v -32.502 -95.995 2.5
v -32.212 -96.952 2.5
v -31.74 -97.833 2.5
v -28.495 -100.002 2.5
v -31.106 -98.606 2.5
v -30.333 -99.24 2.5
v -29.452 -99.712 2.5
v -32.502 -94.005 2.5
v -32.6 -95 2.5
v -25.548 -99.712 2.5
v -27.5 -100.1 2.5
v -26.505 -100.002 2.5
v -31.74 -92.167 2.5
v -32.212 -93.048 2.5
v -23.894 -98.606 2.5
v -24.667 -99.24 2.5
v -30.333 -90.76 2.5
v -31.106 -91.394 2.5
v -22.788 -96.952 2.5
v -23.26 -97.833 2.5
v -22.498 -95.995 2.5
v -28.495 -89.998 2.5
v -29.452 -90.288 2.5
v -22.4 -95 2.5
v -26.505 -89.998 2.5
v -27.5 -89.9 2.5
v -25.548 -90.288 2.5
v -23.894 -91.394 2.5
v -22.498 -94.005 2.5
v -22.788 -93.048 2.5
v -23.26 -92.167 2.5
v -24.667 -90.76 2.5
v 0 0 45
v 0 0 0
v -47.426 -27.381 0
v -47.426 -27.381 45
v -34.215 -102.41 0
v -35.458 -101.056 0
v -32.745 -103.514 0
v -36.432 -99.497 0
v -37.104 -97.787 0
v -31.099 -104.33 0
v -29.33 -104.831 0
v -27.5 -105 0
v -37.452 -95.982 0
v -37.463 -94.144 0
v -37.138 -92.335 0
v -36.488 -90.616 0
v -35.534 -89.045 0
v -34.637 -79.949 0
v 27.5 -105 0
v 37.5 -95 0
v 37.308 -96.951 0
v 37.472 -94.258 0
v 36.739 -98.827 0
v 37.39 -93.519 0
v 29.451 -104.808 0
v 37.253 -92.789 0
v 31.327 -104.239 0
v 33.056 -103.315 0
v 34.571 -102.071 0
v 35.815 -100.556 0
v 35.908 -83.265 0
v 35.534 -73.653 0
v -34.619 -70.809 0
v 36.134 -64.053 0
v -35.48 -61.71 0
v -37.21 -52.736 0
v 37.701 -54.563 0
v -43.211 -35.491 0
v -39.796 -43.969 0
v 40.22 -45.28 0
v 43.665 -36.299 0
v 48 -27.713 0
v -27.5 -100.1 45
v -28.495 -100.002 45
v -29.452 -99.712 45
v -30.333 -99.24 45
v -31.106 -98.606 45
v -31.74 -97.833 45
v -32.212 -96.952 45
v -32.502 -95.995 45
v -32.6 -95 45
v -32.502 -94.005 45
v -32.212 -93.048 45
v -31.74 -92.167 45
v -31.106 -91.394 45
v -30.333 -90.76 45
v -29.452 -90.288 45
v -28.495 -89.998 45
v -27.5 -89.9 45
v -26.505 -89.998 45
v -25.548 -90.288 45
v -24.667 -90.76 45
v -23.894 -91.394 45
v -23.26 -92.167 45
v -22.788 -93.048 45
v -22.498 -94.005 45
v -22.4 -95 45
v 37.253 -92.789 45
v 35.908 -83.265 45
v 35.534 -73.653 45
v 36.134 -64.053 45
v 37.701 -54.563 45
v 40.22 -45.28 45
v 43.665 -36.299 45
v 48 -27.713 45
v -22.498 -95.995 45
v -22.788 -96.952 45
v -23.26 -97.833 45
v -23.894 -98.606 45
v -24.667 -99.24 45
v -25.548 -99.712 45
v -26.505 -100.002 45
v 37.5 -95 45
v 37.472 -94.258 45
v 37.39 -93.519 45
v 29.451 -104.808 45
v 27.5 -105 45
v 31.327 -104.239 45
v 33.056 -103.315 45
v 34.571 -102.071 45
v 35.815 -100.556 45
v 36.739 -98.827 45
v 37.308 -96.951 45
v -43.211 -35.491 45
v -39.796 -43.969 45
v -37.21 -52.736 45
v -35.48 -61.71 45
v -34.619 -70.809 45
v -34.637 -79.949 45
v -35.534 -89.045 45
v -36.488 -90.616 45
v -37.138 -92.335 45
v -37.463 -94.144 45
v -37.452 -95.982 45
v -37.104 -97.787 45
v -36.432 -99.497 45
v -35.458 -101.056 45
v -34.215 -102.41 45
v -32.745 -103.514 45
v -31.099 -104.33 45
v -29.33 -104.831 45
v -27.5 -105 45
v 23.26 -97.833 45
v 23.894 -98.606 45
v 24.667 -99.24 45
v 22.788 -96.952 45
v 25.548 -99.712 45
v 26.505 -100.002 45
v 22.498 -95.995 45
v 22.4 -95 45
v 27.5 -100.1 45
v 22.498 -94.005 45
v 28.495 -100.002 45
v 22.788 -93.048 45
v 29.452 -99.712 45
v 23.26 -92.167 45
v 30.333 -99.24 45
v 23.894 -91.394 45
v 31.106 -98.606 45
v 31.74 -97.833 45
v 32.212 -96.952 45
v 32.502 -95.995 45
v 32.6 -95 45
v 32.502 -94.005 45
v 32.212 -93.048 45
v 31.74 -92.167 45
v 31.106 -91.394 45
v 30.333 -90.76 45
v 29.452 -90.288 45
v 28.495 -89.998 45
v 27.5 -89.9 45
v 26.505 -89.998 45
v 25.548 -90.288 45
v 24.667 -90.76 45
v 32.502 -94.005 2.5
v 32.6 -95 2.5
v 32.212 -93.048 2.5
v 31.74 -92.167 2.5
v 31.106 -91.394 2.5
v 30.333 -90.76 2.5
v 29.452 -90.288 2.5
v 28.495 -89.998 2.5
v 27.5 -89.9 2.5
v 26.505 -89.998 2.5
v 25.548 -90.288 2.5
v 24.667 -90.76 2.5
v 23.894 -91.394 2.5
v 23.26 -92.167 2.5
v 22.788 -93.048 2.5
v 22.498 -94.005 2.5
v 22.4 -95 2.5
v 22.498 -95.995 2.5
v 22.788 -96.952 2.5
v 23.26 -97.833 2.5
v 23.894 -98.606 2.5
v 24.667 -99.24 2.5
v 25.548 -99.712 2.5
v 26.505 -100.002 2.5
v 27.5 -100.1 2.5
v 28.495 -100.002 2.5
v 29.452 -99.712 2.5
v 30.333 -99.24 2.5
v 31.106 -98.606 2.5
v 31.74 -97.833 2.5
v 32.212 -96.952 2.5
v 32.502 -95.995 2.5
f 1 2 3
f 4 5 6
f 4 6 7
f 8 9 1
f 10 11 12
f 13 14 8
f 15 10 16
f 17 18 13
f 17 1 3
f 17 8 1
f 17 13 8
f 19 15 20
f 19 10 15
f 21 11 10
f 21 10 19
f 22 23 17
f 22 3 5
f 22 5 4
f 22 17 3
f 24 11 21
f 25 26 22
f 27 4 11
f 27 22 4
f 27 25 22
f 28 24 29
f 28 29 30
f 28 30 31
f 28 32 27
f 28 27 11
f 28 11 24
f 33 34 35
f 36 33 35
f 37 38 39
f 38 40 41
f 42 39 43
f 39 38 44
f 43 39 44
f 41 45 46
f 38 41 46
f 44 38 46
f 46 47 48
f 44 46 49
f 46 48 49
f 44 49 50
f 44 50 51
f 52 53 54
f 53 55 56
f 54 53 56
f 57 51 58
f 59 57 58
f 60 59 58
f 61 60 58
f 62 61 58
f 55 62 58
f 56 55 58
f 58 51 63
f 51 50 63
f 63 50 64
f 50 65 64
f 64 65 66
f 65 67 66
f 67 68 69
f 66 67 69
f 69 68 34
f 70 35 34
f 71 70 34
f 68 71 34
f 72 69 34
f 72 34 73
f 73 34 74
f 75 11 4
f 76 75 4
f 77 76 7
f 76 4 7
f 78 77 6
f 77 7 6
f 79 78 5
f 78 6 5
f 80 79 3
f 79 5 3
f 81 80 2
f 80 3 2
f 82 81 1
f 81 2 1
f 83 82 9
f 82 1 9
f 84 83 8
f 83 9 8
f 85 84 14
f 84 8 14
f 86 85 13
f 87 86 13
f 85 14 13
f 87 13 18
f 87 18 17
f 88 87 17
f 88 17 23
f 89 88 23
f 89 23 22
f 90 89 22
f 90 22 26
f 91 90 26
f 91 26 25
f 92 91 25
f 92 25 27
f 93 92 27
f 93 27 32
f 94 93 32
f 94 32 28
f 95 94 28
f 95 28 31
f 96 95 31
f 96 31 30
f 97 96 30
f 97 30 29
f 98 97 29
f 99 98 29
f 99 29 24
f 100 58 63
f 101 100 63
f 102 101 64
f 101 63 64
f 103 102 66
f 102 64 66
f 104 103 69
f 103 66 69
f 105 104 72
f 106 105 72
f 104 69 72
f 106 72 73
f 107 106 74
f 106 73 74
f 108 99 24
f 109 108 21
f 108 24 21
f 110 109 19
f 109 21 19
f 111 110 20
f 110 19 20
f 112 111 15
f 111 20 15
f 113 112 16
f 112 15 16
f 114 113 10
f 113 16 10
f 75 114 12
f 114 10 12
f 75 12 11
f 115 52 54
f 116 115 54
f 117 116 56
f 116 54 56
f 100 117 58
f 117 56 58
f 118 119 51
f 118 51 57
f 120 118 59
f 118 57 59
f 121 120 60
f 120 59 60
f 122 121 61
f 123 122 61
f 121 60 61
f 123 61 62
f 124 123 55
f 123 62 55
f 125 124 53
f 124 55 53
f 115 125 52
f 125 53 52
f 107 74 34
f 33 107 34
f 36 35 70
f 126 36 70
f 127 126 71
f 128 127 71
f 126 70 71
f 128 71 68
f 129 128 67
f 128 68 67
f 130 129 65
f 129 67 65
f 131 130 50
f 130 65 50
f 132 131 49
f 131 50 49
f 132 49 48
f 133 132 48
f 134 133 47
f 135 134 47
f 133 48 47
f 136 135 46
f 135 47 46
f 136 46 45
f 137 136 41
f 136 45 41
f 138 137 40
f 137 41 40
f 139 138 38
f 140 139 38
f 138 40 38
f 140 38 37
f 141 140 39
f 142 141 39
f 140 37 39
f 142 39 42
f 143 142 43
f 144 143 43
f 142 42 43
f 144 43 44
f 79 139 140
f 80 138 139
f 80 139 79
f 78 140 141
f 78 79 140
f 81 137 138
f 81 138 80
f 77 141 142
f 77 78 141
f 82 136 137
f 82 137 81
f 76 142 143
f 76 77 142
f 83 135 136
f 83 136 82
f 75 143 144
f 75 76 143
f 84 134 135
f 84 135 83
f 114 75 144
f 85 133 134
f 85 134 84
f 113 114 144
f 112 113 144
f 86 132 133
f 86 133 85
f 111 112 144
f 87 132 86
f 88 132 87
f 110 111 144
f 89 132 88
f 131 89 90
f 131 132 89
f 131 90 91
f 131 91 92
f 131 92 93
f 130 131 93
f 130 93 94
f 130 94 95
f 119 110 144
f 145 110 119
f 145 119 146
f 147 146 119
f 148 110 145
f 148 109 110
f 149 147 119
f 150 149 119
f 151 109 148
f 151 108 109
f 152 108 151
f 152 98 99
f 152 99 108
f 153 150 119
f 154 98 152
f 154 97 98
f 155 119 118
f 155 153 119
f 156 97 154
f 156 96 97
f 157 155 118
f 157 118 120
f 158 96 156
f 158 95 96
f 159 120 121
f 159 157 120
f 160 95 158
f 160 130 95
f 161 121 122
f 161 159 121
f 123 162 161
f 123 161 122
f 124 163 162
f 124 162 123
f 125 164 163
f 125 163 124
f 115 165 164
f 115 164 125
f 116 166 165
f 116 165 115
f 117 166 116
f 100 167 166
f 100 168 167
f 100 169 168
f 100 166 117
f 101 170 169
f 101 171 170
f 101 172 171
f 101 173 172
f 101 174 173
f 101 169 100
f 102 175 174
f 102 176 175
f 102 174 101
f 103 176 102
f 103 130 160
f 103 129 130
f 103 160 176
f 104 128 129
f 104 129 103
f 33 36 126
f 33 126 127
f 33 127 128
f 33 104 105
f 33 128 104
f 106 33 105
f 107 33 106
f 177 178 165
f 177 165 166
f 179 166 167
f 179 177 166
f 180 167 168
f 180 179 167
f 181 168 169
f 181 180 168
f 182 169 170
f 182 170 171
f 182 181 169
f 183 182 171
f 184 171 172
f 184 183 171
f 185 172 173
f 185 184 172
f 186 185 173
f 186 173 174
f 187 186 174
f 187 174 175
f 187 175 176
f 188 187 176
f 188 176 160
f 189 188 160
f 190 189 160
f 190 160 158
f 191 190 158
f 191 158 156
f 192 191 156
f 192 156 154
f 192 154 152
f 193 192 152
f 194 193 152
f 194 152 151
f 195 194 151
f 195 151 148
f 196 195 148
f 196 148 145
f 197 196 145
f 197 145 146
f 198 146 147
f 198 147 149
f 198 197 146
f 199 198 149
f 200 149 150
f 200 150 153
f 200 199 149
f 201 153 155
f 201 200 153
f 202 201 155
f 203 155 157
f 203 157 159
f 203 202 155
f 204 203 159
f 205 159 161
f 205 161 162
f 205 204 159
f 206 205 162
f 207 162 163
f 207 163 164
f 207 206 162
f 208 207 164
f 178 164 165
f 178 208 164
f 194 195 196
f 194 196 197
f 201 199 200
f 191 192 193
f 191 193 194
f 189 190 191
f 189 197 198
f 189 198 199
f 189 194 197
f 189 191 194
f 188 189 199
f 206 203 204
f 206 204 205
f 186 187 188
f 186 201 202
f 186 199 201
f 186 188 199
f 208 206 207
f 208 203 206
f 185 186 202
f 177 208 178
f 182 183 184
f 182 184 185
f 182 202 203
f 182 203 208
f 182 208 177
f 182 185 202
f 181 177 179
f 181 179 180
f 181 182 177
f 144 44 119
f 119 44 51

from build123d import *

# Parameters (mm, degrees)
F0_R     = 5.1
F1_DEPTH = 45
F2_DEPTH = 2.5


with BuildPart() as f1:
    # F0 (on Top) → F1 (new body)
    with BuildSketch(Plane.XY):
        with BuildLine():
            Line((47.999931, -27.712773), (0, 0))
            Line((0, 0), (-47.425757, -27.381273))
            ThreePointArc((-47.425757, -27.381273), (-36.236956, -57.202053), (-35.533555, -89.045002))
            ThreePointArc((-35.533555, -89.045002), (-24.364362, -85.504329), (-17.5, -95))
            ThreePointArc((-17.5, -95), (-20.428932, -102.071068), (-27.5, -105))
            Line((-27.5, -105), (27.5, -105))
            ThreePointArc((27.5, -105), (19.686236, -88.7594), (37.252515, -92.789018))
            ThreePointArc((37.252515, -92.789018), (36.797234, -59.288231), (47.999931, -27.712773))
        make_face()
        with BuildLine():
            ThreePointArc((-17.5, -95), (-24.364362, -85.504329), (-35.533555, -89.045002))
            ThreePointArc((-35.533555, -89.045002), (-36.431685, -99.497223), (-27.5, -105))
            ThreePointArc((-27.5, -105), (-20.428932, -102.071068), (-17.5, -95))
        make_face()
        with BuildLine():
            ThreePointArc((-22.4, -95), (-23.893755, -98.606245), (-27.5, -100.1))
            ThreePointArc((-27.5, -100.1), (-31.106245, -91.393755), (-22.4, -95))
        make_face(mode=Mode.SUBTRACT)
        with BuildLine():
            ThreePointArc((37.5, -95), (37.437936, -93.887605), (37.252515, -92.789018))
            ThreePointArc((37.252515, -92.789018), (19.686236, -88.7594), (27.5, -105))
            ThreePointArc((27.5, -105), (34.571068, -102.071068), (37.5, -95))
        make_face()
        with Locations((27.5, -95)):
            Circle(F0_R, mode=Mode.SUBTRACT)
    extrude(amount=F1_DEPTH)

    # F0 (on Top) → F2 (join)
    with BuildSketch(Plane.XY):
        with Locations((27.5, -95)):
            Circle(F0_R)
        with BuildLine():
            ThreePointArc((-22.4, -95), (-31.106245, -91.393755), (-27.5, -100.1))
            ThreePointArc((-27.5, -100.1), (-23.893755, -98.606245), (-22.4, -95))
        make_face()
    extrude(amount=F2_DEPTH)


solid = f1.part
